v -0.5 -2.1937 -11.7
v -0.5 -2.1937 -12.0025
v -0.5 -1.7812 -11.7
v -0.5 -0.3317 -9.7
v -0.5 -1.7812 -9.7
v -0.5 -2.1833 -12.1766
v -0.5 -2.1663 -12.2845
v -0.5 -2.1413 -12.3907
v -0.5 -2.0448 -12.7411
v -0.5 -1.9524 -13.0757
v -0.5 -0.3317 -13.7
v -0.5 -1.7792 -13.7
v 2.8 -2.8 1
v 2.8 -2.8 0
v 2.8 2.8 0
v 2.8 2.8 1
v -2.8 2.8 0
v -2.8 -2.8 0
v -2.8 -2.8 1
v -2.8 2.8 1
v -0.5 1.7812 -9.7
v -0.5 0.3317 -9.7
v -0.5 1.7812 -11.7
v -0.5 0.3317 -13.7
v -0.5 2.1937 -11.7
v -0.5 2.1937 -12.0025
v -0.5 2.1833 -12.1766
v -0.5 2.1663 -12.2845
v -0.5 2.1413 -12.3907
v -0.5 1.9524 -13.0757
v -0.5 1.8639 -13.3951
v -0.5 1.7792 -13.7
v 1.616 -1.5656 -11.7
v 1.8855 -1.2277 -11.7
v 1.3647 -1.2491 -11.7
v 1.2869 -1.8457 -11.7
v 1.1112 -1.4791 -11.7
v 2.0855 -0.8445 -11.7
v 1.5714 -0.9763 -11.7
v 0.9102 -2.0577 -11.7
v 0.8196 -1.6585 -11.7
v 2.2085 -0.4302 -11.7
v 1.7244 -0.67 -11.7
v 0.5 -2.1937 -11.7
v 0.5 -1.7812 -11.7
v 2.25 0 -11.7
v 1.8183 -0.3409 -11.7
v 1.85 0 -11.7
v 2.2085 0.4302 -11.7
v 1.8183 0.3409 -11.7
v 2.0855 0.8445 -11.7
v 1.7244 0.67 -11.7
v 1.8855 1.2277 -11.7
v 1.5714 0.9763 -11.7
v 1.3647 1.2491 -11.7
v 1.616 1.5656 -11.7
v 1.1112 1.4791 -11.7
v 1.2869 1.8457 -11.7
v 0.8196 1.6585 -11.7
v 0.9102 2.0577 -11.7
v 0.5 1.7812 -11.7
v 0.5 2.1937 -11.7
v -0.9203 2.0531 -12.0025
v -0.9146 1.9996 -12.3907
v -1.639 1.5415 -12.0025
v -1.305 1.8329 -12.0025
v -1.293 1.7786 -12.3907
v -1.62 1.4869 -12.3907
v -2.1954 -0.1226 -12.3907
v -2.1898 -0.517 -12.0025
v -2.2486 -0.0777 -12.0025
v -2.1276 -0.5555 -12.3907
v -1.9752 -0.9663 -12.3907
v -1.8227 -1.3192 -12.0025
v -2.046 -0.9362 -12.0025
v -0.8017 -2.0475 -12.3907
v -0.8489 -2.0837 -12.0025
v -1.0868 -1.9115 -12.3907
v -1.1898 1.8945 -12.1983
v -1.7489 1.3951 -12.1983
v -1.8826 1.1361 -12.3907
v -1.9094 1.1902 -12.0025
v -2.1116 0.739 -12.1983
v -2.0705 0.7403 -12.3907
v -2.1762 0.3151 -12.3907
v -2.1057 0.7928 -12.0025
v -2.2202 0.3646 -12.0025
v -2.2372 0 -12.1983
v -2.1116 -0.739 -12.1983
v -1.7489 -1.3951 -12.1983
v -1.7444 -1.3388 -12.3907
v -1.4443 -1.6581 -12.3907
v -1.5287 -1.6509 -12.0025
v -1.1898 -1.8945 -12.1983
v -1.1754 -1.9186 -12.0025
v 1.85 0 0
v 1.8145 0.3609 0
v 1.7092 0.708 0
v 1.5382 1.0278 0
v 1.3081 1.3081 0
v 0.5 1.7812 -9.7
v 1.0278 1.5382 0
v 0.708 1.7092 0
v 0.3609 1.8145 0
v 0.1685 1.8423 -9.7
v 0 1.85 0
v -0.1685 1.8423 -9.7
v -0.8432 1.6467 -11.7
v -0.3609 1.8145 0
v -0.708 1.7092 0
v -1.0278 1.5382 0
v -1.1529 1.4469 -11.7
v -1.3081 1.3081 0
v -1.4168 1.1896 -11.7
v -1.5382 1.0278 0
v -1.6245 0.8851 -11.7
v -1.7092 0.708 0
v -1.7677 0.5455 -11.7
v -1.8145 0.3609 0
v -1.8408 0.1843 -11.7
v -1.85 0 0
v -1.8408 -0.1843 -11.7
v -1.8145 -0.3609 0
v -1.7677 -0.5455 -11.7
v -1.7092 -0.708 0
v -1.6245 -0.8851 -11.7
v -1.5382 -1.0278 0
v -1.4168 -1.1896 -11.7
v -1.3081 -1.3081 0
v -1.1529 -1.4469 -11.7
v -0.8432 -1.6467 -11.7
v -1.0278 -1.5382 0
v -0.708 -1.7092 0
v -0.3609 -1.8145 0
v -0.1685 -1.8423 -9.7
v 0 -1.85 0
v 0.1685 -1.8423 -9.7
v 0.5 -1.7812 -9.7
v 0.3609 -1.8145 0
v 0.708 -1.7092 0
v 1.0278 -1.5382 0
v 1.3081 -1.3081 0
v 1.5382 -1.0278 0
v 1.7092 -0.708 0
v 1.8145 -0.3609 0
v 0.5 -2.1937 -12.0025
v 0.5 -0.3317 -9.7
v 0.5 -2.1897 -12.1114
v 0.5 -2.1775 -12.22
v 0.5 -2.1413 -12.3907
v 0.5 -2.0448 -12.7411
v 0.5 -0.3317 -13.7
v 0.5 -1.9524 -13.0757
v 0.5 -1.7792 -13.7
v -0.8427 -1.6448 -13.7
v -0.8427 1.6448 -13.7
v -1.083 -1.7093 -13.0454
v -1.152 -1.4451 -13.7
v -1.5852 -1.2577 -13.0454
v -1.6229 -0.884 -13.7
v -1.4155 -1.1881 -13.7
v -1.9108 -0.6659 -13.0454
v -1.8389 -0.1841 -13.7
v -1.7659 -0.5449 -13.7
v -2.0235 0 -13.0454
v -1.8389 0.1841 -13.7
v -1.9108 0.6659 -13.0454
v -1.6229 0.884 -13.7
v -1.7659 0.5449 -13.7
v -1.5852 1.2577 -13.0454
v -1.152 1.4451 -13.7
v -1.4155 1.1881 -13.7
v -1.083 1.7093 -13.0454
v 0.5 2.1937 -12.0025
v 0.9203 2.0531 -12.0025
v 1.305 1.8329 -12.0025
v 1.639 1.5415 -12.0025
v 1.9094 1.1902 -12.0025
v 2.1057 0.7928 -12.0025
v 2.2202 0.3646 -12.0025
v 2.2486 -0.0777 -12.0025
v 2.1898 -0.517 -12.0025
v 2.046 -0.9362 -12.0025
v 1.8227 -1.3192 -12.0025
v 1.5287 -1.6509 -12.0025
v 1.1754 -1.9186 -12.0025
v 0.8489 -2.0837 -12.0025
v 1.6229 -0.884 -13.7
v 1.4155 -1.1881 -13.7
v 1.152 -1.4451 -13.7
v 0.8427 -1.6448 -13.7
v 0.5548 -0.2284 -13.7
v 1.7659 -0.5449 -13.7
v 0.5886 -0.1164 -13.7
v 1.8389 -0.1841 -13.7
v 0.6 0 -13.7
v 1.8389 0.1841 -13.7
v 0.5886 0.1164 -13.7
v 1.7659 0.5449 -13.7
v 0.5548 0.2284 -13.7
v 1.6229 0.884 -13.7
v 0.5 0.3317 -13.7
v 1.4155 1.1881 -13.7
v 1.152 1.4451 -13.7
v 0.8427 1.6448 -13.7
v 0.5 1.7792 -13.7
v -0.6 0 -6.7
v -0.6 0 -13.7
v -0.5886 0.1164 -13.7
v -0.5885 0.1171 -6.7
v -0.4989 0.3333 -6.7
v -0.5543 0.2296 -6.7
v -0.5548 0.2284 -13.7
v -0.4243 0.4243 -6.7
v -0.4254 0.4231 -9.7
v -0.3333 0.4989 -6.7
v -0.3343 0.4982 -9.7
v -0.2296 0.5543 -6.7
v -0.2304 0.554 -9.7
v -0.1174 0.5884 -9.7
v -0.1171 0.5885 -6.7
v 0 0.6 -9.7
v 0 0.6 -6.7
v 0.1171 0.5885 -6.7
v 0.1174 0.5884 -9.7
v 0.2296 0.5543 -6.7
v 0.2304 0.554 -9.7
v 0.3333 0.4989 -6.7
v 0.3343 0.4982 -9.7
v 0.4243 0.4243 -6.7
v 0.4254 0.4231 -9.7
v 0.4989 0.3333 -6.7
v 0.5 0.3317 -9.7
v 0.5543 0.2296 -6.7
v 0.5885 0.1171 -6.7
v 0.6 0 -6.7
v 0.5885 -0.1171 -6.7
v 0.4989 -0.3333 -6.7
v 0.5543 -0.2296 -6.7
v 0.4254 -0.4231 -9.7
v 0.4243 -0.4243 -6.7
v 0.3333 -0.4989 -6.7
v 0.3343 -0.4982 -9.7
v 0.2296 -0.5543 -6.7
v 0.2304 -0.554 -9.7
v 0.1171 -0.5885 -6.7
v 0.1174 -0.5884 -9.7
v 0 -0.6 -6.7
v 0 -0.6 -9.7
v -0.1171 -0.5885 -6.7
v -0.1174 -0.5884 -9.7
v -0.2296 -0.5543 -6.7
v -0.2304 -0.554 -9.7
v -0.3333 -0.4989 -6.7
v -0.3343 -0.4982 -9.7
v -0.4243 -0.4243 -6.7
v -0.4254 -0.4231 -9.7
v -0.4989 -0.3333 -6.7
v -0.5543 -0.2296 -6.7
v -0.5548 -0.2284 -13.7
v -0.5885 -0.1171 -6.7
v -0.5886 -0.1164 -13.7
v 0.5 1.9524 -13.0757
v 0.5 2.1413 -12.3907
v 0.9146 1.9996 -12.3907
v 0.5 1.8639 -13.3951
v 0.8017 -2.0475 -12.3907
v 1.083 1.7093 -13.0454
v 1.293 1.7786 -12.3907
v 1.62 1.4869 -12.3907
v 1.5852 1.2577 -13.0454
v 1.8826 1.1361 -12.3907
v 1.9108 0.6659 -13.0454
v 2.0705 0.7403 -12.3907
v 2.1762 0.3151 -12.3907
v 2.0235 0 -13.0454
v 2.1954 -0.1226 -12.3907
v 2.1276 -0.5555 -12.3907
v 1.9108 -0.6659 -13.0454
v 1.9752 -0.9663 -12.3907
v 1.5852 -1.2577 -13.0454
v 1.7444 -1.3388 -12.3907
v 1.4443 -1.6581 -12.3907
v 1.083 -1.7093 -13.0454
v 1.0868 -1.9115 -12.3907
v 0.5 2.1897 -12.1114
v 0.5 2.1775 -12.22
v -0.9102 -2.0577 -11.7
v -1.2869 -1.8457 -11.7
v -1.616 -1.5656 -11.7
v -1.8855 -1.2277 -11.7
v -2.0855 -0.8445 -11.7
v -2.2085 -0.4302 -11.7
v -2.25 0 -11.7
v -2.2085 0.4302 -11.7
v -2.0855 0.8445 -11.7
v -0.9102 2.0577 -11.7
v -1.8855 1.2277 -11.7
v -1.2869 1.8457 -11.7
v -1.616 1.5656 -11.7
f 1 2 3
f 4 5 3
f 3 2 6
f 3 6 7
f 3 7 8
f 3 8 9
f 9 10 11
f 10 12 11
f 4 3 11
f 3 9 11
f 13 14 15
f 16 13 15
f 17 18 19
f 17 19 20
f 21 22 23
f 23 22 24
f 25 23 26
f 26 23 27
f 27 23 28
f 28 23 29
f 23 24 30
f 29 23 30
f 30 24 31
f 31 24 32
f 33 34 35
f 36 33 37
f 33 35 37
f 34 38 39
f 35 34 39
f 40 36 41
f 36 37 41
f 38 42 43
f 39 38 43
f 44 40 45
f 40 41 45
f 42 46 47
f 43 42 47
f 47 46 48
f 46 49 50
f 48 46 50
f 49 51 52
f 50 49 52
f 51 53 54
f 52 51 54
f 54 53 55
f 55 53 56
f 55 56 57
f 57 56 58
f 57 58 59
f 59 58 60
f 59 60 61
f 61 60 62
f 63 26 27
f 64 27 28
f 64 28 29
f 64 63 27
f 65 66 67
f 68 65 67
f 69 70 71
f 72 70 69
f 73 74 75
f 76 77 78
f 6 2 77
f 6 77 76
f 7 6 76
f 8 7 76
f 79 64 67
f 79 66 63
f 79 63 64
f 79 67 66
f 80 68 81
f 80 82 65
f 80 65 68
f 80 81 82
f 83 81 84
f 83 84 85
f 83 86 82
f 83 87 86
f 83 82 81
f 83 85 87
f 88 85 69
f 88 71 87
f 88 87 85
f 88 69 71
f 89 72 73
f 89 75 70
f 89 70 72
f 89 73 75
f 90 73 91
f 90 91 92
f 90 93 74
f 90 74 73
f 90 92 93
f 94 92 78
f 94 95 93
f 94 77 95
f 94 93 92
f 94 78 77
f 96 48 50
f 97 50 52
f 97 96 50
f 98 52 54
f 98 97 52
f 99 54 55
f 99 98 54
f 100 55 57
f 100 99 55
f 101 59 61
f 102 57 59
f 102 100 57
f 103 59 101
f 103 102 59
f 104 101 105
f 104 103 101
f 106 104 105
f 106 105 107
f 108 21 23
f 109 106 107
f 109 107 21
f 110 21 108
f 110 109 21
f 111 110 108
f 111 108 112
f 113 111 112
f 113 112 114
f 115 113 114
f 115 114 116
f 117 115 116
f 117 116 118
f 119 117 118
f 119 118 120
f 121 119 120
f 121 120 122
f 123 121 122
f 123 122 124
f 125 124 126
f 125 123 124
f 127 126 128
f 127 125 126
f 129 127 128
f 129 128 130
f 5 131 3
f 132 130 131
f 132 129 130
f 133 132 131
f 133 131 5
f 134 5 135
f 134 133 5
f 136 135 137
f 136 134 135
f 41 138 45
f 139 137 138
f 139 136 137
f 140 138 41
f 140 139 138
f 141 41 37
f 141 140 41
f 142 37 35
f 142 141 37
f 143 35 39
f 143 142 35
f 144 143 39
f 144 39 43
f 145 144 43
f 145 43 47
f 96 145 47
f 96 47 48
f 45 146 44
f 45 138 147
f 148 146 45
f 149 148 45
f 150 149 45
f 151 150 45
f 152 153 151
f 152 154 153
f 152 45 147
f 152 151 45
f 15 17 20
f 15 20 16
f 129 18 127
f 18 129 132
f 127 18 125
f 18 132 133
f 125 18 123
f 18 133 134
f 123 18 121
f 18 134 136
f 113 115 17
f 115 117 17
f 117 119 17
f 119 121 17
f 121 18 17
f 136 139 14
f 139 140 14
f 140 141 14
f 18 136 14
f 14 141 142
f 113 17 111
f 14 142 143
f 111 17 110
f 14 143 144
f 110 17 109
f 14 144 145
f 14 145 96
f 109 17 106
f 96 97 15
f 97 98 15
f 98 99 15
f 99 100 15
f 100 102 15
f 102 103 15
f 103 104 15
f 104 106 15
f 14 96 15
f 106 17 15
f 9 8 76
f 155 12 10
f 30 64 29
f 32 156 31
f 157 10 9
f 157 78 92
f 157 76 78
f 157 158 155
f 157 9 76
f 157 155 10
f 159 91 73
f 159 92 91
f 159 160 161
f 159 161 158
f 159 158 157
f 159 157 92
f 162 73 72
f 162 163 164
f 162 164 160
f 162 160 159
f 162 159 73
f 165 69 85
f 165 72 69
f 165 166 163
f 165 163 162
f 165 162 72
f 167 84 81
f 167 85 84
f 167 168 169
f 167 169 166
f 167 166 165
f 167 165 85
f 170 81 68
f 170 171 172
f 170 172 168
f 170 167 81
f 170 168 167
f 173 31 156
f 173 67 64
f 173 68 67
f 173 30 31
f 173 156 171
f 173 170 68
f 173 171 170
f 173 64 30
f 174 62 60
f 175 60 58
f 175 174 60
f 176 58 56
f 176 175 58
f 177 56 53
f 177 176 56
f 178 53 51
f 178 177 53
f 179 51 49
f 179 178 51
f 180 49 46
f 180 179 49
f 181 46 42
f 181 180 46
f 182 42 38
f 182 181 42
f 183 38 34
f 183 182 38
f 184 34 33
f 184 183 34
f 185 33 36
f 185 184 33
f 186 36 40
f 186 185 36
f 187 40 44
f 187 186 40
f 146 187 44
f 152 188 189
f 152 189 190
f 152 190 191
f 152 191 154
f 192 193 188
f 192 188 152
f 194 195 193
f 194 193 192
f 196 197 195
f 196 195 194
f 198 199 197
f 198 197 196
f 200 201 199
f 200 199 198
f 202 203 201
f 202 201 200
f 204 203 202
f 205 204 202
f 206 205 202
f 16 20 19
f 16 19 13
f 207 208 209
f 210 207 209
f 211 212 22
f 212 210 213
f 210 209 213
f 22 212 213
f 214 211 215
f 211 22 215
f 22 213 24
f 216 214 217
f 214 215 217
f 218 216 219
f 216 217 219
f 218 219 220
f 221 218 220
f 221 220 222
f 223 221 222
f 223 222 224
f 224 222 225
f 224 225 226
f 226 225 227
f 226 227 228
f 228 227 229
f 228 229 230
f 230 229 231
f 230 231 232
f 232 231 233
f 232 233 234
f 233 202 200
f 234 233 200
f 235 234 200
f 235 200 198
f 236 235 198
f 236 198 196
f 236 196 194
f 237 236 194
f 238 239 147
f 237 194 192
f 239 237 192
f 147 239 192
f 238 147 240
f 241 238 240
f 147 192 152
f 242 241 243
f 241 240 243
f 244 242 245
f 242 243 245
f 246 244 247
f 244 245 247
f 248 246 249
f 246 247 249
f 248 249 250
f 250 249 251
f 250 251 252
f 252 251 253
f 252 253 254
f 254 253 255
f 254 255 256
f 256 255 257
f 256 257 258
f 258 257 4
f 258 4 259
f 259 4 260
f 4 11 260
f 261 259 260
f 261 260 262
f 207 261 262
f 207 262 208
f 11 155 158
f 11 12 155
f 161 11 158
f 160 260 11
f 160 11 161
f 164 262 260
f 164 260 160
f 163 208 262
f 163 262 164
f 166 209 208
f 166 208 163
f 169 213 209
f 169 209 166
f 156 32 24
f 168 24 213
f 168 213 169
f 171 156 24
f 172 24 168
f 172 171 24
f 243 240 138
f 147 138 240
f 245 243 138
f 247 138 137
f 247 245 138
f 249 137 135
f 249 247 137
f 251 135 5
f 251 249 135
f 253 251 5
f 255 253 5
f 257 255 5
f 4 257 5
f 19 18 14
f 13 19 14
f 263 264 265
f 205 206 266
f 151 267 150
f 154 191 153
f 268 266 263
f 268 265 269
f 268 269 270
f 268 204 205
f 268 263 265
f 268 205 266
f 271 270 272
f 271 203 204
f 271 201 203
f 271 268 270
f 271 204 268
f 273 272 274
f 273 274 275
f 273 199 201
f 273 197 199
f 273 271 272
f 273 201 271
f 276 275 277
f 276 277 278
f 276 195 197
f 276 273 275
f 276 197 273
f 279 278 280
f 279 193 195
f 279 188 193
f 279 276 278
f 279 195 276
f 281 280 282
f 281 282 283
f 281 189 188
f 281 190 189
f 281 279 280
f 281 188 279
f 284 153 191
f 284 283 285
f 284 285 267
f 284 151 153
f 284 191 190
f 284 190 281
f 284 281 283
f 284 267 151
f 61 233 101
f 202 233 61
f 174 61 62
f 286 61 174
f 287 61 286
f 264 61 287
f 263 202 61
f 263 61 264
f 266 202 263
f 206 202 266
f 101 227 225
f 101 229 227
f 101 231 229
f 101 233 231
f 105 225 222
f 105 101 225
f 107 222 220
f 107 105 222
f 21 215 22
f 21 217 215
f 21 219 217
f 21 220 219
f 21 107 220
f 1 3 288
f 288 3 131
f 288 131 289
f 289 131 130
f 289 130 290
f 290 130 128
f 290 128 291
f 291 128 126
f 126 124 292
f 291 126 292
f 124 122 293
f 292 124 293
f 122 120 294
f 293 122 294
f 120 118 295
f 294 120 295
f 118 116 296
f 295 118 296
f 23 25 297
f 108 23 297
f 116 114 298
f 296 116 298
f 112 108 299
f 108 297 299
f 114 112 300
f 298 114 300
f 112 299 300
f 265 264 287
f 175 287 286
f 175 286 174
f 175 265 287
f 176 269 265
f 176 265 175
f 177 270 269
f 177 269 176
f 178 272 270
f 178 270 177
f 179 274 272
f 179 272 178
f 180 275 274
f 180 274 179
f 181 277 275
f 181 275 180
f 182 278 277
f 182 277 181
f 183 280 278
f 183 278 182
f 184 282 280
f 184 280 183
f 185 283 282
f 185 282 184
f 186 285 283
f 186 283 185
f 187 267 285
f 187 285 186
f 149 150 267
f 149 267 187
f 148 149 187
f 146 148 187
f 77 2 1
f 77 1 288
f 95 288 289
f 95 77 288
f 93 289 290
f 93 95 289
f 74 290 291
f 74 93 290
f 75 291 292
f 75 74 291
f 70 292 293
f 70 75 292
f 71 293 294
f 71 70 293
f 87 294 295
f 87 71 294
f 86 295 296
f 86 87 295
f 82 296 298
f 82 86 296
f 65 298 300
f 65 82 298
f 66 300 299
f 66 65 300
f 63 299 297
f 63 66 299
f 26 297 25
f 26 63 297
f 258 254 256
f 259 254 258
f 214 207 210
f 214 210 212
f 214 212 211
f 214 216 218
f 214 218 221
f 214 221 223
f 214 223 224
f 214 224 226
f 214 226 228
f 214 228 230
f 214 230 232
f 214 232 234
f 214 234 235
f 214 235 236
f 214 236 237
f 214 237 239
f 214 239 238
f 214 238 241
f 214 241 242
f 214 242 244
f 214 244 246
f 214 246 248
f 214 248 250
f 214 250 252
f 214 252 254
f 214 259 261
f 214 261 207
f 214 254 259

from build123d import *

# Parameters (mm, degrees)
SKETCH1_W           = 5.6
SKETCH1_H           = 5.6
BOSS_EXTRUDE1_DEPTH = 1
SKETCH1_3_R         = 1.85
BOSS_EXTRUDE2_DEPTH = 11.7
SKETCH2_R           = 0.6
CUT_EXTRUDE1_DEPTH  = 5
BOSS_EXTRUDE3_START = 2
SKETCH3_R           = 2.25
SKETCH3_R_2         = 0.6
BOSS_EXTRUDE3_DEPTH = 2
CHAMFER1_SIZE       = 1.5
CHAMFER1_SIZE2      = 0.401923789
SKETCH4_W           = 1
SKETCH4_H           = 5.286883196
CUT_EXTRUDE3_DEPTH  = 4
FILLET1_R           = 1.5


with BuildPart() as part:
    # Sketch1 → Boss-Extrude1 (new body)
    with BuildSketch(Plane.XY):
        Rectangle(SKETCH1_W, SKETCH1_H)
    extrude(amount=BOSS_EXTRUDE1_DEPTH)

    # Sketch1<3> → Boss-Extrude2 (add)
    with BuildSketch(Plane.XY):
        Circle(SKETCH1_3_R)
    extrude(amount=-BOSS_EXTRUDE2_DEPTH)

    # Sketch2 → Cut-Extrude1 (cut)
    with BuildSketch(Plane(origin=(0, 0, -11.7), x_dir=(-1, 0, 0), z_dir=(0, 0, -1))):
        Circle(SKETCH2_R)
    extrude(amount=-CUT_EXTRUDE1_DEPTH, mode=Mode.SUBTRACT)

    # Sketch3 → Boss-Extrude3 (add)
    with BuildSketch(Plane(origin=(0, 0, -11.7), x_dir=(-1, 0, 0), z_dir=(0, 0, -1)).offset(BOSS_EXTRUDE3_START)):
        Circle(SKETCH3_R)
        Circle(SKETCH3_R_2, mode=Mode.SUBTRACT)
    extrude(amount=-BOSS_EXTRUDE3_DEPTH)

    # Chamfer1
    chamfer1_edges = [part.edges().sort_by_distance(p)[0] for p in [
        (2.25, 0, -13.7),
    ]]
    chamfer1_side = [part.faces().sort_by_distance(p)[0] for p in [
        (2.25, 0, -12.7),
    ]]
    chamfer(chamfer1_edges, length=CHAMFER1_SIZE, length2=CHAMFER1_SIZE2, reference=chamfer1_side[0])

    # Sketch4 → Cut-Extrude3 (cut)
    with BuildSketch(Plane(origin=(0, 0, -13.7), x_dir=(-1, 0, 0), z_dir=(0, 0, -1))):
        Rectangle(SKETCH4_W, SKETCH4_H)
    extrude(amount=-CUT_EXTRUDE3_DEPTH, mode=Mode.SUBTRACT)

    # Fillet1
    fillet1_edges = [part.edges().sort_by_distance(p)[0] for p in [
        (2.25, 0, -12.2),
        (-2.25, 0, -12.2),
    ]]
    fillet(fillet1_edges, radius=FILLET1_R)


solid = part.part
